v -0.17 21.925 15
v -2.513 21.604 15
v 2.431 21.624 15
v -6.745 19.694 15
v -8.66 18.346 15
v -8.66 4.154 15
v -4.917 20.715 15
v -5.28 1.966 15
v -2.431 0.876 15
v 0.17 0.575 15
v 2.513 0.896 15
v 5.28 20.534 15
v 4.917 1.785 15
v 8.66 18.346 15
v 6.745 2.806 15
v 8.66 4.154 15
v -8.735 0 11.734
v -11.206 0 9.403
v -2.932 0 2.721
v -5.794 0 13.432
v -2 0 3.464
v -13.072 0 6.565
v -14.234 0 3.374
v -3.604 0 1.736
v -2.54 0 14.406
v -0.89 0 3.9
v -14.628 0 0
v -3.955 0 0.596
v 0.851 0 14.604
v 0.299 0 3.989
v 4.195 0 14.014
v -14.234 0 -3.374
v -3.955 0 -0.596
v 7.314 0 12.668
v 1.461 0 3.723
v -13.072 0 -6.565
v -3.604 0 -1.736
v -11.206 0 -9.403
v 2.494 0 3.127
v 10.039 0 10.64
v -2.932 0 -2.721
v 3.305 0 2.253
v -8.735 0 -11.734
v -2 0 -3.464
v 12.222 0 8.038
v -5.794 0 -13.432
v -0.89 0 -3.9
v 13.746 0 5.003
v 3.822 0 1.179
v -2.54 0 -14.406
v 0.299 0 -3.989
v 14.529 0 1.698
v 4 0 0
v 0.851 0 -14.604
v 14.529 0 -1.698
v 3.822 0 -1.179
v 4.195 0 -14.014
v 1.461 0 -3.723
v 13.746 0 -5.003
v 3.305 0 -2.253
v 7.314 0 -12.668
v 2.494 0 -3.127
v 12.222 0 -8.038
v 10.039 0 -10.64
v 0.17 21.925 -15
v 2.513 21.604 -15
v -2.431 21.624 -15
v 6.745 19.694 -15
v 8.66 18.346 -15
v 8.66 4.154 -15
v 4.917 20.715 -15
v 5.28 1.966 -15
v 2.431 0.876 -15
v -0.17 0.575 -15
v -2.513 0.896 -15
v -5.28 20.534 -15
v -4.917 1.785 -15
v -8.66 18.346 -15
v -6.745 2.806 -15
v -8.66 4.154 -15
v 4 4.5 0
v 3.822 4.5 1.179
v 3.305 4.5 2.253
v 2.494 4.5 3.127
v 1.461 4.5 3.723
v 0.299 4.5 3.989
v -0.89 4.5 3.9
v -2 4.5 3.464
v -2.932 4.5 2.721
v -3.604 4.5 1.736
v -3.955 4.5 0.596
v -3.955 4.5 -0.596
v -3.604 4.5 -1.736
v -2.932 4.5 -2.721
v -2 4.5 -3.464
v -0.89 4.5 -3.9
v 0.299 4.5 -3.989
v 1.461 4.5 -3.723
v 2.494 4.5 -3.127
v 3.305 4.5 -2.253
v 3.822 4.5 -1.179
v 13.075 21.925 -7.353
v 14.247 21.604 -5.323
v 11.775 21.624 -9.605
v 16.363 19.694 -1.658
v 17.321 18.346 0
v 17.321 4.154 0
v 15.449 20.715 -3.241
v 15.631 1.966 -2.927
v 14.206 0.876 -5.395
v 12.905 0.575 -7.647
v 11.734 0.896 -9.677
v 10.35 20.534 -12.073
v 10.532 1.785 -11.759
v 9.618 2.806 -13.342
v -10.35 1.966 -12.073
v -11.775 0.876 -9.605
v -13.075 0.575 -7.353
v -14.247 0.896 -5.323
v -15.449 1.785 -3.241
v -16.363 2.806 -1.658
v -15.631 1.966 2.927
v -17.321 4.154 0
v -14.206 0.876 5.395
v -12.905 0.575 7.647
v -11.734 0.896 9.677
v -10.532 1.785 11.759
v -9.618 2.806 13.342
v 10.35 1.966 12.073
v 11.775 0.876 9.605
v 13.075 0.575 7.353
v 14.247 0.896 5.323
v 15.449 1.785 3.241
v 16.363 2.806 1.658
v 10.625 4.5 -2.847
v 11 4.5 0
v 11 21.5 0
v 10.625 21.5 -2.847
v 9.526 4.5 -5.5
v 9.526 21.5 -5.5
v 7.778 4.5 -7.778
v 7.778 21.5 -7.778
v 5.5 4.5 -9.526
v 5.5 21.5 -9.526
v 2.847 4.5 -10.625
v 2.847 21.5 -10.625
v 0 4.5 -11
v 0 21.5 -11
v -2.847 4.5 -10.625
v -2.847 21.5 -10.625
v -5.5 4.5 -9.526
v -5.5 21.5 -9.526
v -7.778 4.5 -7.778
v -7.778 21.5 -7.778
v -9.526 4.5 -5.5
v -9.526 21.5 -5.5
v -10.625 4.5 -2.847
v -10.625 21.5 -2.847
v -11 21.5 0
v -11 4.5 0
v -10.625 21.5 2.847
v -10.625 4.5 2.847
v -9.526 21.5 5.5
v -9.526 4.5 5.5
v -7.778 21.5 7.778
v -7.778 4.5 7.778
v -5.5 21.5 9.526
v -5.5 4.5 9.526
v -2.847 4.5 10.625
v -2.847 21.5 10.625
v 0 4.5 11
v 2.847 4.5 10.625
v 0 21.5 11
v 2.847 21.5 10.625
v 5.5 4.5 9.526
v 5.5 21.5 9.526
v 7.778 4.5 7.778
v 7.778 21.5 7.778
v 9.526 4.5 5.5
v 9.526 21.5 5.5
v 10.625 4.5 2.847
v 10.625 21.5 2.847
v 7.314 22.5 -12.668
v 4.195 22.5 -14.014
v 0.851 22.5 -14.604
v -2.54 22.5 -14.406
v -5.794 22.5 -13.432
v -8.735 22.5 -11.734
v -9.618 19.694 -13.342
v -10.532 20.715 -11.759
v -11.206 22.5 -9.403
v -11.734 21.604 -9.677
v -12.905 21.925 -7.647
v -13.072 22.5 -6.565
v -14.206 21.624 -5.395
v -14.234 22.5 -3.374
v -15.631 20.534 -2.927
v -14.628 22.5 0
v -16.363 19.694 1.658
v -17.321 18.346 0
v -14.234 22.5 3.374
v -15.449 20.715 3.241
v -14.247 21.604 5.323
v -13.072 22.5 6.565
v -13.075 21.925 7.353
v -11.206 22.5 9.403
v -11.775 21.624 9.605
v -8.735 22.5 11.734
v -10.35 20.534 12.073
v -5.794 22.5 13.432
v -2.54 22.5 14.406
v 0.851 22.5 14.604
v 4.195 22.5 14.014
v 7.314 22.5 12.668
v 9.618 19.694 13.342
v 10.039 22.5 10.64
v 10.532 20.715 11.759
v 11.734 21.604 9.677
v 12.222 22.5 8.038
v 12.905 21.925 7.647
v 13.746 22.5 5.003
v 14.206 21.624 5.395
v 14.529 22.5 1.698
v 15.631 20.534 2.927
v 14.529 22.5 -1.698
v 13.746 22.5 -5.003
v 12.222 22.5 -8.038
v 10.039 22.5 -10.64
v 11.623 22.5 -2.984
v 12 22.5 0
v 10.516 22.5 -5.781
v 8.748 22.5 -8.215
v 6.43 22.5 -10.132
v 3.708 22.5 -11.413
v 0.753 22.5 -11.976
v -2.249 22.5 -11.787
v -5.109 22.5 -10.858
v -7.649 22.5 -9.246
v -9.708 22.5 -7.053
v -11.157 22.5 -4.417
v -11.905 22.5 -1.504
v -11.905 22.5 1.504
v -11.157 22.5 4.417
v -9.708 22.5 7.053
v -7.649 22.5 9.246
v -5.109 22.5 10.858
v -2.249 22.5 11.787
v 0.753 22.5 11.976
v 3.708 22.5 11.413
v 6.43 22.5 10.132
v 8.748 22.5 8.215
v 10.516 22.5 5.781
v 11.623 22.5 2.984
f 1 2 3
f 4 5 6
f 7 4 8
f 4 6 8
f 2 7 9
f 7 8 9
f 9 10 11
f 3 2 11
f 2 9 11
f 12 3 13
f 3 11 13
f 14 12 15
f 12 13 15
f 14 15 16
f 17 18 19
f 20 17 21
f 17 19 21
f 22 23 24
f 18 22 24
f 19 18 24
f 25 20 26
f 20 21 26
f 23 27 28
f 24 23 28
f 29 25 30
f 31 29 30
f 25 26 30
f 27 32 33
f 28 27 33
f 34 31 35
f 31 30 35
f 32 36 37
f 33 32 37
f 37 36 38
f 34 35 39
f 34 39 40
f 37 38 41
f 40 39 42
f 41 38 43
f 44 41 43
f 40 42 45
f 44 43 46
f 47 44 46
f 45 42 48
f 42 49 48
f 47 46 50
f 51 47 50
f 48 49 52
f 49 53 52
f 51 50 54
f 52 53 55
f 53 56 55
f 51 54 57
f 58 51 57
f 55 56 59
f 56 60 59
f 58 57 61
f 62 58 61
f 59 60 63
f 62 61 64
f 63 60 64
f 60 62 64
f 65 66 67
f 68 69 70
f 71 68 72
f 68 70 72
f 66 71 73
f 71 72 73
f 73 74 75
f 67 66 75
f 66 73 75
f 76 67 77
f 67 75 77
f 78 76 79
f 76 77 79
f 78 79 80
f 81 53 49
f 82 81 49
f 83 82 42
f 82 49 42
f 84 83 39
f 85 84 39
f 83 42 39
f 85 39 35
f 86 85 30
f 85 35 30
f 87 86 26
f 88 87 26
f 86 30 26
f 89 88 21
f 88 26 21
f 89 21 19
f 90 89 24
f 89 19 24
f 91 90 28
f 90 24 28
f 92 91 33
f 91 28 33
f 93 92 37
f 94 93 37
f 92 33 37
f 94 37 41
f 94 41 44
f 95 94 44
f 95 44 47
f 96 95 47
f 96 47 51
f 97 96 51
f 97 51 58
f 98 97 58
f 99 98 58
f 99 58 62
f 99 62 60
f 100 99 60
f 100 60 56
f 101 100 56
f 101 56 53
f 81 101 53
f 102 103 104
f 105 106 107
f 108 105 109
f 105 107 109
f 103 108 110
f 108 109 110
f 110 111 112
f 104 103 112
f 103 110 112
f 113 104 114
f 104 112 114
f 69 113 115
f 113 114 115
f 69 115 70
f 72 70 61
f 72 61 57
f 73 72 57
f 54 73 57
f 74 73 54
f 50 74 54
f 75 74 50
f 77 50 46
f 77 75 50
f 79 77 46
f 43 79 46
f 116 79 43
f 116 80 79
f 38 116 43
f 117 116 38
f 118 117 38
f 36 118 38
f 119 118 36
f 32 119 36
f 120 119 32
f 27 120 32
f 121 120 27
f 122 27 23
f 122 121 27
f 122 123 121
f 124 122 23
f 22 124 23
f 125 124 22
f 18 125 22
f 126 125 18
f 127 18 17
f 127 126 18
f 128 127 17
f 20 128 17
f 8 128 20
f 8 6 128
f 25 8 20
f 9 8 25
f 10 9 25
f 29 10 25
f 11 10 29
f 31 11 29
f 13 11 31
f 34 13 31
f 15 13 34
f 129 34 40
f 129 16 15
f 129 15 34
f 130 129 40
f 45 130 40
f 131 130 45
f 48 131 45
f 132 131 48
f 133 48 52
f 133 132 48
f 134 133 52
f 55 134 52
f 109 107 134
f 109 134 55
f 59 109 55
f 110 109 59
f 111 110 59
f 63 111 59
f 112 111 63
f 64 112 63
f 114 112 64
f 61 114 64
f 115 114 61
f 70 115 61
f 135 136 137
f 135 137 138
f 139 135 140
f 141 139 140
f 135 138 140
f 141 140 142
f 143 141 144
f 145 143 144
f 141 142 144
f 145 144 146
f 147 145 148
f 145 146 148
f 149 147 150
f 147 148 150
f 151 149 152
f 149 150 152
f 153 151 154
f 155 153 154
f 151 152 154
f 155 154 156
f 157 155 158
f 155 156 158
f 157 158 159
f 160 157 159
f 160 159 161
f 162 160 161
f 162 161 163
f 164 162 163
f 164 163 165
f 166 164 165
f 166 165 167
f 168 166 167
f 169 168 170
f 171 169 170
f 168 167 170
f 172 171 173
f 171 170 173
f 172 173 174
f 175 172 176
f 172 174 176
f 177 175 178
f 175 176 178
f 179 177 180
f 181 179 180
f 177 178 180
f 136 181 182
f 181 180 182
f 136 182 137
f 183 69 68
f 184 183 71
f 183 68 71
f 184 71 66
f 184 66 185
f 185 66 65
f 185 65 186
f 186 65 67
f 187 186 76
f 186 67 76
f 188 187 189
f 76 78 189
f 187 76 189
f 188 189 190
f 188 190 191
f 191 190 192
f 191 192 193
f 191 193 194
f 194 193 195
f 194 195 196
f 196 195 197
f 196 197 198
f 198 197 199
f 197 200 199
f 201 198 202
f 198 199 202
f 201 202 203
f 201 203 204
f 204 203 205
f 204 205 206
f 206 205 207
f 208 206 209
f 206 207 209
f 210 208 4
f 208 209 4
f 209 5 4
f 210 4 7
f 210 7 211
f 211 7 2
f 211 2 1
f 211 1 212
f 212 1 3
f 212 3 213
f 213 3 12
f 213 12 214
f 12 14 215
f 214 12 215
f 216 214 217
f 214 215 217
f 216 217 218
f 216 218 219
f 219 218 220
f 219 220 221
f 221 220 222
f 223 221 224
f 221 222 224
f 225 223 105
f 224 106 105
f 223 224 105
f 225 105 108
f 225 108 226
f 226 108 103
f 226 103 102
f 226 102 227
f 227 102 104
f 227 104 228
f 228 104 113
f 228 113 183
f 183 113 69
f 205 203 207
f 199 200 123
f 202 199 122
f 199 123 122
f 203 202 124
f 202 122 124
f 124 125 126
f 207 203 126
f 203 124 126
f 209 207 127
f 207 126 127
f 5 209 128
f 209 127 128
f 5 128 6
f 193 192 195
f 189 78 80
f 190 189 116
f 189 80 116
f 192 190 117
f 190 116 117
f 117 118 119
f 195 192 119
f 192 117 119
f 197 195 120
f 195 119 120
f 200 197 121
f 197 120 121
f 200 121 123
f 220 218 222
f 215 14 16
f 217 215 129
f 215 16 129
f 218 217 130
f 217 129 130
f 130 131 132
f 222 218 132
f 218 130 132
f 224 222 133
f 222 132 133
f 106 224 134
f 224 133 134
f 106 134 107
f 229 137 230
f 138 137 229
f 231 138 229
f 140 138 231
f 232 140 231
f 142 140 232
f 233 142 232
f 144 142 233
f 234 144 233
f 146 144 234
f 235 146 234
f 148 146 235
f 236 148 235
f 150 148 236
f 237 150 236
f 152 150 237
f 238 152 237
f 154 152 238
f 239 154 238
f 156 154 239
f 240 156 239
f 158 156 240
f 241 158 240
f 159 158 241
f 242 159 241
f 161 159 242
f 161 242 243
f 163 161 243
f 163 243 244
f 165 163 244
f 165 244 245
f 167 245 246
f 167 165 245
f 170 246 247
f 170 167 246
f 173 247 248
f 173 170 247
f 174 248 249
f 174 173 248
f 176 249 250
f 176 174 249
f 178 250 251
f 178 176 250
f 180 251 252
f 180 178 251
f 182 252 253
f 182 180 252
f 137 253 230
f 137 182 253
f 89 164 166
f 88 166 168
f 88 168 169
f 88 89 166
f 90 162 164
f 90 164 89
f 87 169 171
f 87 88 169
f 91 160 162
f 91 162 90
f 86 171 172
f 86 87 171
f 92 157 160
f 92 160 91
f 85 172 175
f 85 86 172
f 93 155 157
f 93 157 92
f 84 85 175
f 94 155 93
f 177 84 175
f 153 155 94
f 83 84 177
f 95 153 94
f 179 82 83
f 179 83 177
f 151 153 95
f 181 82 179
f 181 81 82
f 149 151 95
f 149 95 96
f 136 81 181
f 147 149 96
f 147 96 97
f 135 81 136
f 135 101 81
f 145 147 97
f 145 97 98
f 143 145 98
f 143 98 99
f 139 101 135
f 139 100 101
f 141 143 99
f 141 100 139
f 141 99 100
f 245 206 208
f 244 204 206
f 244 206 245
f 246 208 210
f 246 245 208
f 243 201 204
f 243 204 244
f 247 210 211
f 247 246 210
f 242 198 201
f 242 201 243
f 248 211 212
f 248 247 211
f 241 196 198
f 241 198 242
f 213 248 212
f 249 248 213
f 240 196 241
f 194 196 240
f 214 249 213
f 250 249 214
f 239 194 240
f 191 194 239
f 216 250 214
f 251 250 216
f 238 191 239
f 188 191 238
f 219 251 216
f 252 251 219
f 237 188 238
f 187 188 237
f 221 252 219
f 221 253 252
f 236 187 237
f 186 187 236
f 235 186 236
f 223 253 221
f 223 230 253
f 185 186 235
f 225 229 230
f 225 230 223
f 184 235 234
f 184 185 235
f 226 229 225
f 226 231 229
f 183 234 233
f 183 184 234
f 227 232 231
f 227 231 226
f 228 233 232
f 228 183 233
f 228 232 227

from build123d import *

# Parameters (mm, degrees)
EXTRUDE_1_DEPTH     = 22.5
SKETCH_2_R          = 11
CUT_EXTRUDE_2_DEPTH = 18
CUT_EXTRUDE_3_REACH = 24.5
SKETCH_3_R          = 4
CHAMFER_1_SIZE      = 1


with BuildPart() as part:
    # Эскиз1 → Бобышка-Вытянуть1 (new body)
    with BuildSketch(Plane(origin=(0, 0, 0), x_dir=(1, 0, 0), z_dir=(0, 1, 0))):
        Polygon((17.320508076, 0), (8.660254038, 15), (-8.660254038, 15), (-17.320508076, 0), (-8.660254038, -15), (8.660254038, -15), align=None)
    extrude(amount=EXTRUDE_1_DEPTH)

    # Эскиз2 → Вырез-Вытянуть2 (cut)
    with BuildSketch(Plane(origin=(0, 22.5, 0), x_dir=(1, 0, 0), z_dir=(0, 1, 0))):
        Circle(SKETCH_2_R)
    extrude(amount=-CUT_EXTRUDE_2_DEPTH, mode=Mode.SUBTRACT)

    # Эскиз3 → Вырез-Вытянуть3 (cut, up to next)
    with BuildSketch(Plane.XZ, mode=Mode.PRIVATE) as cut_extrude_3_sk1:
        Circle(SKETCH_3_R)
    cut_extrude_3_tool1 = extrude(cut_extrude_3_sk1.sketch, amount=-CUT_EXTRUDE_3_REACH, mode=Mode.PRIVATE) & part.part
    add(cut_extrude_3_tool1.solids().sort_by_distance((0, 0, 0))[0], mode=Mode.SUBTRACT)

    # Эскиз4 → Вырез-Повернуть1 (revolve, cut)
    with BuildSketch(Plane(origin=(0, 0, 0), x_dir=(-0.5, 0, 0.866025404), z_dir=(-0.866025404, 0, -0.5))):
        Polygon((-17.320508076, 18.345818937), (-17.320508076, 22.5), (-14.628303654, 22.5), align=None)
    cut_revolve_1 = revolve(axis=Axis((0, 0, 0), (0, 1, 0)), mode=Mode.SUBTRACT)

    # Зеркальное отражение1: Вырез-Повернуть1 across plane
    add(cut_revolve_1.mirror(Plane.ZX.offset(11.25)), mode=Mode.SUBTRACT)

    # Фаска1
    chamfer_1_edges = [part.edges().sort_by_distance(p)[0] for p in [
        (-11, 22.5, 0),
    ]]
    chamfer(chamfer_1_edges, length=CHAMFER_1_SIZE)


solid = part.part
